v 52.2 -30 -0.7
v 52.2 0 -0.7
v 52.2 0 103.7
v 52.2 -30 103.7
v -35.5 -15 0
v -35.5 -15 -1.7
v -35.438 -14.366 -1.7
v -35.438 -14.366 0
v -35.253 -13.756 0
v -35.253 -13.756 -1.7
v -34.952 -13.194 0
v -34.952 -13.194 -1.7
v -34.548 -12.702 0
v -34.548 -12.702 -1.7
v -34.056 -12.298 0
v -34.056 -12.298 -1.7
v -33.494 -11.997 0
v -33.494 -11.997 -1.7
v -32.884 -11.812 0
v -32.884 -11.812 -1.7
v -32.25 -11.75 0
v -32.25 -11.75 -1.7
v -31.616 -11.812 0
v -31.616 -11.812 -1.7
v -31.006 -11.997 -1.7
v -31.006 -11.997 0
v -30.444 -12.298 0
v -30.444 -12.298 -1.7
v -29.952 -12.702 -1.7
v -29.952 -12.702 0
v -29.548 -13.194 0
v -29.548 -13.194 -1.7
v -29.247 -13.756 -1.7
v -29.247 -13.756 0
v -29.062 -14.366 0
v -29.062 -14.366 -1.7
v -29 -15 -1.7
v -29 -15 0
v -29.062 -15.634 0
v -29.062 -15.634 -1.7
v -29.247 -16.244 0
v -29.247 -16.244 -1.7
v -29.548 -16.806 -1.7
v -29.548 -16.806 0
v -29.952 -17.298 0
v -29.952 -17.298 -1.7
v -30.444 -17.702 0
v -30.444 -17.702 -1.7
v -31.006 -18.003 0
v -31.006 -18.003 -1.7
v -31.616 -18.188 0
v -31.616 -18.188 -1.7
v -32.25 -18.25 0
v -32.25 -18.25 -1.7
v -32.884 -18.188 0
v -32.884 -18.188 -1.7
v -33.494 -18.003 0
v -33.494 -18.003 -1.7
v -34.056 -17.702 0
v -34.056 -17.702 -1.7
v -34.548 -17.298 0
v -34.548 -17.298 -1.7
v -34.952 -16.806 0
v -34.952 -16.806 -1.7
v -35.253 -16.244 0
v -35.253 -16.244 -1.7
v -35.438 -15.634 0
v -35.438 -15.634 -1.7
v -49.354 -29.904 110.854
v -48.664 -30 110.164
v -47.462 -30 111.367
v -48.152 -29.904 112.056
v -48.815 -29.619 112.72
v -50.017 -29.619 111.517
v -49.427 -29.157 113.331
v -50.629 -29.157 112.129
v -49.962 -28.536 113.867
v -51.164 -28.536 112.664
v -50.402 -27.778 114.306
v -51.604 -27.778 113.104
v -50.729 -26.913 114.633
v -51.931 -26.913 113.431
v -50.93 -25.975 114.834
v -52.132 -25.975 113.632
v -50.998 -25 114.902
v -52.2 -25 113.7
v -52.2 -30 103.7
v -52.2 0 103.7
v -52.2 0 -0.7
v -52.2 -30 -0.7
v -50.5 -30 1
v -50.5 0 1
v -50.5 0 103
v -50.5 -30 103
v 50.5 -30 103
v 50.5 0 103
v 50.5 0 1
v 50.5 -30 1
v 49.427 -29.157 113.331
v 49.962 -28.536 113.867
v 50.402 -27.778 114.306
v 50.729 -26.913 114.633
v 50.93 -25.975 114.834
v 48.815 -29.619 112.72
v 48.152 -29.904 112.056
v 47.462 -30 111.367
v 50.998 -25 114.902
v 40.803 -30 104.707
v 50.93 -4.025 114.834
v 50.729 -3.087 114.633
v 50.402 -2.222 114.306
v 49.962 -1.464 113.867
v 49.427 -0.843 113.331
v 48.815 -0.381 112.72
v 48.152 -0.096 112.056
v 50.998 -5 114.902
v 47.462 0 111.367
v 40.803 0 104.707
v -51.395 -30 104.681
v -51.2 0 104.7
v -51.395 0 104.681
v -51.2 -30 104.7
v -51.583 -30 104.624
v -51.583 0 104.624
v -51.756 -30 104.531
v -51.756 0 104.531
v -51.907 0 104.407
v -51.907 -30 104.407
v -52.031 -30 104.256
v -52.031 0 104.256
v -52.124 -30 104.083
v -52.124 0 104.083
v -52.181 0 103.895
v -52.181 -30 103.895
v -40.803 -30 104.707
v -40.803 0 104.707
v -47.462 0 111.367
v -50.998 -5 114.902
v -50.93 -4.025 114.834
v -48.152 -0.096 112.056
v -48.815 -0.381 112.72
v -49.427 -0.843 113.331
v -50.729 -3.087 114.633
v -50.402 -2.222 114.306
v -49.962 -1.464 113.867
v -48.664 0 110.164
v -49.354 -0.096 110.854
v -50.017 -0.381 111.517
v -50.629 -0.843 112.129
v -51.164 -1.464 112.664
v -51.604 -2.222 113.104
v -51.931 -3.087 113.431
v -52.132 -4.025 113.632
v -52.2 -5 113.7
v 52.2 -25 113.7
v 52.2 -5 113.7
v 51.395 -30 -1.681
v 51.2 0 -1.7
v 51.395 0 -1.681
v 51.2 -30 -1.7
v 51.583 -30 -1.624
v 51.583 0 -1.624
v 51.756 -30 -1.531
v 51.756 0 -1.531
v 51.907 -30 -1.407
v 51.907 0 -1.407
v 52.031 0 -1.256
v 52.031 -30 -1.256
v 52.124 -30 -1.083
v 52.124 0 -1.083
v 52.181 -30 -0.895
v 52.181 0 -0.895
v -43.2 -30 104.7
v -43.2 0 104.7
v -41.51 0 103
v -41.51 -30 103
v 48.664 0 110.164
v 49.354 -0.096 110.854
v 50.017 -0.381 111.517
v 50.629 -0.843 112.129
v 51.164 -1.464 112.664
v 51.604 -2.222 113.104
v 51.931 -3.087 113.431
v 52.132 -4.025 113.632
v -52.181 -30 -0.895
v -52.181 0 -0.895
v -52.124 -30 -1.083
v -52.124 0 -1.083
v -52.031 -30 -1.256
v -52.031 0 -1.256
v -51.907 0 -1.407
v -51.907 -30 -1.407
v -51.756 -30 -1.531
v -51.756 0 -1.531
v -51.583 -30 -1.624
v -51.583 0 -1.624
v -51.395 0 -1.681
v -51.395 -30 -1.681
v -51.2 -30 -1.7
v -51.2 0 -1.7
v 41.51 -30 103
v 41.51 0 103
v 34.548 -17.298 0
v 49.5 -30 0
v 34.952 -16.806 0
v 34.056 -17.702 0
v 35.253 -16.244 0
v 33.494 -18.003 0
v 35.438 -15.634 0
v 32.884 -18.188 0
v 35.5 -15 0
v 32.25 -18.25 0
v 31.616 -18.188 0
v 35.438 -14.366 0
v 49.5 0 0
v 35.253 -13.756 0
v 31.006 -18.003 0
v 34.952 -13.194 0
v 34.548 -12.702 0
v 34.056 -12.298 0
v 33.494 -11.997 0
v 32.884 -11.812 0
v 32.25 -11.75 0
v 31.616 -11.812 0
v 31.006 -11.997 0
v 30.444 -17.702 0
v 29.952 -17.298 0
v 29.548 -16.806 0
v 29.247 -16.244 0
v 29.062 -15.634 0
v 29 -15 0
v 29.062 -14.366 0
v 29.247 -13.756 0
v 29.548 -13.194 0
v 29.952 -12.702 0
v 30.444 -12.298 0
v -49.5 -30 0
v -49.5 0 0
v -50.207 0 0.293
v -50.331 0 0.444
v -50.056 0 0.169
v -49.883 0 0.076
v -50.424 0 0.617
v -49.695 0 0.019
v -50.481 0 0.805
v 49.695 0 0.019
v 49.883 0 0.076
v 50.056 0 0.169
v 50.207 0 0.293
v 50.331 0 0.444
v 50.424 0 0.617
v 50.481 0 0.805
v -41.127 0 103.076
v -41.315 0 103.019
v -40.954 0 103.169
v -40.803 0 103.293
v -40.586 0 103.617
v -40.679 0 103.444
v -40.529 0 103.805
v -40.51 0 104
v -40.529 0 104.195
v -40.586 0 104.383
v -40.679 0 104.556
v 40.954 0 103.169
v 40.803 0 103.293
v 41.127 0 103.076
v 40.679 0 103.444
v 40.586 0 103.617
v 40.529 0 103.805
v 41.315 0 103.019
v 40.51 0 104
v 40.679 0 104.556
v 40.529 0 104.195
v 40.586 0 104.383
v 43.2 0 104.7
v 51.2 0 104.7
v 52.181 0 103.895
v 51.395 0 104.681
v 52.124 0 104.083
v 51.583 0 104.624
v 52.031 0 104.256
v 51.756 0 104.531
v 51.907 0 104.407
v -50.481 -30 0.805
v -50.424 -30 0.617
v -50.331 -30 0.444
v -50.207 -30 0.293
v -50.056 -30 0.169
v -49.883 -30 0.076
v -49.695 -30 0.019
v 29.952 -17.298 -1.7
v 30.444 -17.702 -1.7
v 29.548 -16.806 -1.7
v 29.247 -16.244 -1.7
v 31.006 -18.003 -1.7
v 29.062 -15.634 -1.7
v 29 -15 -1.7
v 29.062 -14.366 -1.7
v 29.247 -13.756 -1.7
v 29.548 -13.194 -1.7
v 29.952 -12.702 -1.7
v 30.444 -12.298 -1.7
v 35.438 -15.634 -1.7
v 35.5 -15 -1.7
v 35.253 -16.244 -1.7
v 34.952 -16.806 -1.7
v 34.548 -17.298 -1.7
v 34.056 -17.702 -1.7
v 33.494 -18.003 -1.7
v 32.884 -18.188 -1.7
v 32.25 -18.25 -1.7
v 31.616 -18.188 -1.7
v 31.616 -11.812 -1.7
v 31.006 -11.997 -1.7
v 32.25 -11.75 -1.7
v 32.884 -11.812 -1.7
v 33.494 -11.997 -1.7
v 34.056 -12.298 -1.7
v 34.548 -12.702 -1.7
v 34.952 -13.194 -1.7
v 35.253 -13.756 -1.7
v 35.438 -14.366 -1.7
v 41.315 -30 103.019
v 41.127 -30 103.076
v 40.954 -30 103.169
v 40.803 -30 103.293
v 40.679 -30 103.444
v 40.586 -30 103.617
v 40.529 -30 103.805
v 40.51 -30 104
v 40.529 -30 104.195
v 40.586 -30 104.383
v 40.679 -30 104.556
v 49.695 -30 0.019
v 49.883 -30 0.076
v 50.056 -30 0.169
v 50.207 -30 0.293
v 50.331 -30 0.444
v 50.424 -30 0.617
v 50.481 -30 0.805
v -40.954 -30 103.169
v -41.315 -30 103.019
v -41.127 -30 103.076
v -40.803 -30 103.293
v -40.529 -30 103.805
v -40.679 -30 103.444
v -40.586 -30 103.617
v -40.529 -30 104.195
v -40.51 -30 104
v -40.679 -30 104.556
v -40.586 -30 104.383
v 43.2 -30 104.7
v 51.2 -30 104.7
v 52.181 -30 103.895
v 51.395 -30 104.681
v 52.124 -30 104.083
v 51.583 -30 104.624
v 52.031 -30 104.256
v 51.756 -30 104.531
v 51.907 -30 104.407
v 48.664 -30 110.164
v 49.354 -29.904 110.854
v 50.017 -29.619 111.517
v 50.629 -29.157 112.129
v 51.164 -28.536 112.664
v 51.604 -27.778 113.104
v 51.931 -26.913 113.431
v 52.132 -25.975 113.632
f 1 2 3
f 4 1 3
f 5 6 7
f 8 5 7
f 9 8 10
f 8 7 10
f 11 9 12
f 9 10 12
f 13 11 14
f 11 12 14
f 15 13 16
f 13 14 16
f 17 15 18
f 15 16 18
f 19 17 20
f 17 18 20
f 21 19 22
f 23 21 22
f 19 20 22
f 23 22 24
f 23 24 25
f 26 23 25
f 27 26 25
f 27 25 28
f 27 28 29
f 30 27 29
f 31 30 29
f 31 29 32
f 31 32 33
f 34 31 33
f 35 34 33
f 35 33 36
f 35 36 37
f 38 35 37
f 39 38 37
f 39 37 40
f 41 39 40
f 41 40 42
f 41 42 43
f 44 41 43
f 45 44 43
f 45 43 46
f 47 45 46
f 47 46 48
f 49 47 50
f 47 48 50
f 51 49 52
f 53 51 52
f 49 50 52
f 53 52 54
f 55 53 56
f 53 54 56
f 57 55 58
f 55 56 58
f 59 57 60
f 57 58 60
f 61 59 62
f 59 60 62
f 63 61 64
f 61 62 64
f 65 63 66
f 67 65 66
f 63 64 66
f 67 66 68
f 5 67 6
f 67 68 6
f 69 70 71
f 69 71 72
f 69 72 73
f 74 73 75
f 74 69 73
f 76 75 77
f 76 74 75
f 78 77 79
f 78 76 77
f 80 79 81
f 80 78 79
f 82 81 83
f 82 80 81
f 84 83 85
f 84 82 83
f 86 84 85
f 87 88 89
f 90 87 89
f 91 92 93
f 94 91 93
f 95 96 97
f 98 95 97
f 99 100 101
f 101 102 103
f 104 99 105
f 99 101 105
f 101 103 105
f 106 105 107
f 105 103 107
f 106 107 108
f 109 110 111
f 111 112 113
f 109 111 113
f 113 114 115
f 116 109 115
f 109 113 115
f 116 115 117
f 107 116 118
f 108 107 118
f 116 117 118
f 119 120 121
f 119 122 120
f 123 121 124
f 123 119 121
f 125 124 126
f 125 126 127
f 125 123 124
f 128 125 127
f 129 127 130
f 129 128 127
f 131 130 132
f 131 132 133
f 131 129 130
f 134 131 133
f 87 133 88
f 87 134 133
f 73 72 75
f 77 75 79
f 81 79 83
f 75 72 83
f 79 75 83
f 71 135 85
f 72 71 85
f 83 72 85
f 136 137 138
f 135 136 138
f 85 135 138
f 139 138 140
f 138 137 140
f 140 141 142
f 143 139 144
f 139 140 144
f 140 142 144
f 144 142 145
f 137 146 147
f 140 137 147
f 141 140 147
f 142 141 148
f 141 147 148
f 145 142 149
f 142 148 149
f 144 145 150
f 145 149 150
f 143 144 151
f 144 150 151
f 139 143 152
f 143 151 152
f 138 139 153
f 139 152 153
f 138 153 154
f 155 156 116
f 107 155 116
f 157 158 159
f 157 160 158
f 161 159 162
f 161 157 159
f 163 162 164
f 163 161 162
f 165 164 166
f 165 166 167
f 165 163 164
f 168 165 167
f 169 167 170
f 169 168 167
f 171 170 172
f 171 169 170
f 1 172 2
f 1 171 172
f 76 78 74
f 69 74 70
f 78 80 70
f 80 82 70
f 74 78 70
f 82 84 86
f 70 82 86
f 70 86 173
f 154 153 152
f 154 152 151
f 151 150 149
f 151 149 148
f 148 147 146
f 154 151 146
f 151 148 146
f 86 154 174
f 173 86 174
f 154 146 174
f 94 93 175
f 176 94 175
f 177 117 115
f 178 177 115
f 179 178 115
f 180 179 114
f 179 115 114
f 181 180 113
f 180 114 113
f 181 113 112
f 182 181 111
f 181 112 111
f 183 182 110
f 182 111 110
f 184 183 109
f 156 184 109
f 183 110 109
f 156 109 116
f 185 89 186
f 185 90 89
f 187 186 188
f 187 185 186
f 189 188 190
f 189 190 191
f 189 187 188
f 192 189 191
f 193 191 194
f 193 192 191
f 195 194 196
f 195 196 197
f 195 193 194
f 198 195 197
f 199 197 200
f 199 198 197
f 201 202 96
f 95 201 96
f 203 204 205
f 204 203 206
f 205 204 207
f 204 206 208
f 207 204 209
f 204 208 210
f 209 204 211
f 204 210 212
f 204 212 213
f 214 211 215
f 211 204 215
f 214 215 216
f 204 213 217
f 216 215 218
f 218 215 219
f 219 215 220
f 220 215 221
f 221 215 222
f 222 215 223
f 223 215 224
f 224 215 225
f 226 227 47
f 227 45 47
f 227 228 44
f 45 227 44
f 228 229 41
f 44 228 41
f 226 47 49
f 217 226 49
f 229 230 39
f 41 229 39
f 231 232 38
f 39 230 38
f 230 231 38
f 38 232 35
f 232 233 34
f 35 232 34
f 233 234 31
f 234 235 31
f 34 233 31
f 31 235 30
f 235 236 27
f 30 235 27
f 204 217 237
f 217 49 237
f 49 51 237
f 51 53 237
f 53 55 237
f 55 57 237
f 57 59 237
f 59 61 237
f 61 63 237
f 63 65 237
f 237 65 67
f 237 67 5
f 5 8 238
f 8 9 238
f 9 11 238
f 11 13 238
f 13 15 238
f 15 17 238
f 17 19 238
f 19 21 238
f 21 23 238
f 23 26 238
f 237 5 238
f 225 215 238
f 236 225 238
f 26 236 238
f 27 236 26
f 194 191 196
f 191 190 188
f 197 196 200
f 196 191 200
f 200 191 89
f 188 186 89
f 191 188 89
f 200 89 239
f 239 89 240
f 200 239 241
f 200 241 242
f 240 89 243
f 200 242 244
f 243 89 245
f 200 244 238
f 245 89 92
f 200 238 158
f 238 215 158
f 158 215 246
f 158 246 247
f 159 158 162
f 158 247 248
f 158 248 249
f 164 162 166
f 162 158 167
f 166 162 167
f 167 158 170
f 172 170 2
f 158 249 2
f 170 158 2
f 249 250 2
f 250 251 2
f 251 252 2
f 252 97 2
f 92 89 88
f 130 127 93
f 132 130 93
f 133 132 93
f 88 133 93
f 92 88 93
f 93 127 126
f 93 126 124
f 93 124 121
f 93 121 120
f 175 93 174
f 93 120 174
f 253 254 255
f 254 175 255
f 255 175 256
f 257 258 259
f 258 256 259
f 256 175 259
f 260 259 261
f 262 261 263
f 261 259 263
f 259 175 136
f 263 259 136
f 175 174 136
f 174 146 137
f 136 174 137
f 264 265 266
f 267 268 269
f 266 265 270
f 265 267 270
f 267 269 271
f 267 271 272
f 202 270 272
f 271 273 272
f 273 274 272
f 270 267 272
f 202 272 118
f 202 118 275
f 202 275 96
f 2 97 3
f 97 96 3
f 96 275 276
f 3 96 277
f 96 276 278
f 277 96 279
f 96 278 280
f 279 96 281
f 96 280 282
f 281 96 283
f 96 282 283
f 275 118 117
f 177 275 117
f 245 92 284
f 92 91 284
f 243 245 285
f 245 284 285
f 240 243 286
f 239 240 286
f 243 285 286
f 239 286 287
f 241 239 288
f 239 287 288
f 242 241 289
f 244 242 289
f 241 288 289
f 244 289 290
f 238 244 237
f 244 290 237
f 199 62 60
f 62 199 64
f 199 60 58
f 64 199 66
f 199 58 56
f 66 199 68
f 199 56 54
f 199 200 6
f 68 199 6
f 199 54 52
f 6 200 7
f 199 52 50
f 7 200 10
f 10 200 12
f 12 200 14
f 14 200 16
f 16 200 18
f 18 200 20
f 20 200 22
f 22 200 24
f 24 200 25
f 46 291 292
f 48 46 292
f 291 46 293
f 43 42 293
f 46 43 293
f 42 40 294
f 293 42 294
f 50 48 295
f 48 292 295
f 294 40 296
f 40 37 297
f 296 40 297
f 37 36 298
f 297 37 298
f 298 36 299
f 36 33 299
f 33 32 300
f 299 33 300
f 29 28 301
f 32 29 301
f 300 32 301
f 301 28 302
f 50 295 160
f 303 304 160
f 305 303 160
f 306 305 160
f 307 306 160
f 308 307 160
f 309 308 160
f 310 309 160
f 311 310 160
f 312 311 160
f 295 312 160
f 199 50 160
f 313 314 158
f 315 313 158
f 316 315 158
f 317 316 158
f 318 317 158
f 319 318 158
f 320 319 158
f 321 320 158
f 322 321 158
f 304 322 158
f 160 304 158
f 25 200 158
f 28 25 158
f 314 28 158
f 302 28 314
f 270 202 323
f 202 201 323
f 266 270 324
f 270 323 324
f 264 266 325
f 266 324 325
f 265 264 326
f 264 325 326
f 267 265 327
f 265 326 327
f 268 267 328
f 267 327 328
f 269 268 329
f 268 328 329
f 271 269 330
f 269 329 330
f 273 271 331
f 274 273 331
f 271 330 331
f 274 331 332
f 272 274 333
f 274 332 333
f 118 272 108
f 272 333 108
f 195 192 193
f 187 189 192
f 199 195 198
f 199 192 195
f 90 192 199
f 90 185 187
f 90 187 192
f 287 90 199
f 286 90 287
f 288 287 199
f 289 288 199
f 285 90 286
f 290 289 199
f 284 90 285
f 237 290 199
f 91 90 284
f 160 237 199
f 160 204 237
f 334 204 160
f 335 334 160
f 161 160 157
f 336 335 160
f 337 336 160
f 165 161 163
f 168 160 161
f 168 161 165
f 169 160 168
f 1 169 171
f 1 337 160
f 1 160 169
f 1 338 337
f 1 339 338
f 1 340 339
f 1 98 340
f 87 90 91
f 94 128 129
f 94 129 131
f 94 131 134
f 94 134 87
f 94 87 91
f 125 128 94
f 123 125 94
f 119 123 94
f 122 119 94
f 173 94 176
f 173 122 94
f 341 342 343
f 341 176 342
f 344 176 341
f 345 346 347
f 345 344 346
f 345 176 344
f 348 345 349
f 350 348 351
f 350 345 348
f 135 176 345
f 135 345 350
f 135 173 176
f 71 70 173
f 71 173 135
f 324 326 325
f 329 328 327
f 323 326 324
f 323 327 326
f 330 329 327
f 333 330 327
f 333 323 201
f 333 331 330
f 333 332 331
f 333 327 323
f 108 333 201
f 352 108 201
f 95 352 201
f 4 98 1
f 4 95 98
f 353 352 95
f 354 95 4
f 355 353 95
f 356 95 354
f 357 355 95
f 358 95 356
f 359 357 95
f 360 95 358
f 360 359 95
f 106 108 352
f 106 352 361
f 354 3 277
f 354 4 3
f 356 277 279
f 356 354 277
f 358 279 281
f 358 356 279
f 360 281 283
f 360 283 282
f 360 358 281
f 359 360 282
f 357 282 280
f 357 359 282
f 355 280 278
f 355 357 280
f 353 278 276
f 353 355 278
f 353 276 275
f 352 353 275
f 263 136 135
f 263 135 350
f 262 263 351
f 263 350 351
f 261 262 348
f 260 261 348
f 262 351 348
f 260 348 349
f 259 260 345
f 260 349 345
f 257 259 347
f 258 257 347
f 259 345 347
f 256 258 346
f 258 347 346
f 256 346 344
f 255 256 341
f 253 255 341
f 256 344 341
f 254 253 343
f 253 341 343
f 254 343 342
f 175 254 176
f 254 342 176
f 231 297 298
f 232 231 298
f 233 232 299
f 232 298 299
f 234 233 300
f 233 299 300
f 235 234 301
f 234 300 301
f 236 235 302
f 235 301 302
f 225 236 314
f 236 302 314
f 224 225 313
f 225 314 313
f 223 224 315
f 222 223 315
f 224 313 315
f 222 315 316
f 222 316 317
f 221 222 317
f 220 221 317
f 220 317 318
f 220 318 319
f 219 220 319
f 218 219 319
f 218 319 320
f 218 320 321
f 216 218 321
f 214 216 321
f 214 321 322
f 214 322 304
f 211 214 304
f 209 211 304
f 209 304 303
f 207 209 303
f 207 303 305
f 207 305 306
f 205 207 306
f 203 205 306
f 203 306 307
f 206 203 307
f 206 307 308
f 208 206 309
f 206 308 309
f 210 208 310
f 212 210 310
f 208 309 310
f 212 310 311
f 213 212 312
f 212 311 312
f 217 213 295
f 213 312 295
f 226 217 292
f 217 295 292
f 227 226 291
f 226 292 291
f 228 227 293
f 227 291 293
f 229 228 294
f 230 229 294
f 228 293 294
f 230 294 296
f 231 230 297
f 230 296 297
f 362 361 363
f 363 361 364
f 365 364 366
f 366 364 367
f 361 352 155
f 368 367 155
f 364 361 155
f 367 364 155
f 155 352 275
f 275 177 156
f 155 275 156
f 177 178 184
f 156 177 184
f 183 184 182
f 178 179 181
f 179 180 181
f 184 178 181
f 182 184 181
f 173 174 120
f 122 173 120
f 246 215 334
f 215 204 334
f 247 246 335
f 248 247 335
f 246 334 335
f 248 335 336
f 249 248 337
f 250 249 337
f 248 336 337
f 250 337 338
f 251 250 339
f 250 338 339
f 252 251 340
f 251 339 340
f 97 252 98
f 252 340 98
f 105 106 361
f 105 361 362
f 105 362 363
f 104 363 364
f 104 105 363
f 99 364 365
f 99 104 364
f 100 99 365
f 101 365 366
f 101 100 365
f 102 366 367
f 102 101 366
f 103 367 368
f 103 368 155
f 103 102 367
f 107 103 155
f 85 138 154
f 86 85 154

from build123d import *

# Parameters (mm, degrees)
F1_DEPTH = 30
F3_D     = 6.5
F4_R     = 5
F5_R     = 1


with BuildPart() as f1:
    # F0 (on Front) → F1 (new body)
    with BuildSketch(Plane.XZ):
        Polygon((50.5, 0), (0, 0), (-50.5, 0), (-50.5, 103), (-41.288837, 103), (-39.095837, 103), (-50.997918, 114.902082), (-52.2, 113.7), (-43.2, 104.7), (-52.2, 104.7), (-52.2, -1.7), (0, -1.7), (52.2, -1.7), (52.2, 104.7), (43.2, 104.7), (52.2, 113.7), (50.997918, 114.902082), (39.095837, 103), (41.288837, 103), (50.5, 103), align=None)
    extrude(amount=F1_DEPTH)

    # F3 (through all)
    with Locations(Plane.XY):
        with Locations((32.25, -15), (-32.25, -15)):
            Hole(F3_D / 2)

    # F4
    f4_edges = [f1.edges().sort_by_distance(p)[0] for p in [
        (-51.598959, 0, 114.301041),
        (-51.598959, -30, 114.301041),
        (51.598959, 0, 114.301041),
        (51.598959, -30, 114.301041),
    ]]
    fillet(f4_edges, radius=F4_R)

    # F5
    f5_edges = [f1.edges().sort_by_distance(p)[0] for p in [
        (52.2, -15, 104.7),
        (-39.095837, -15, 103),
        (-52.2, -15, 104.7),
        (-50.5, -15, 0),
        (52.2, -15, -1.7),
        (39.095837, -15, 103),
        (50.5, -15, 0),
        (-52.2, -15, -1.7),
    ]]
    fillet(f5_edges, radius=F5_R)


solid = f1.part
